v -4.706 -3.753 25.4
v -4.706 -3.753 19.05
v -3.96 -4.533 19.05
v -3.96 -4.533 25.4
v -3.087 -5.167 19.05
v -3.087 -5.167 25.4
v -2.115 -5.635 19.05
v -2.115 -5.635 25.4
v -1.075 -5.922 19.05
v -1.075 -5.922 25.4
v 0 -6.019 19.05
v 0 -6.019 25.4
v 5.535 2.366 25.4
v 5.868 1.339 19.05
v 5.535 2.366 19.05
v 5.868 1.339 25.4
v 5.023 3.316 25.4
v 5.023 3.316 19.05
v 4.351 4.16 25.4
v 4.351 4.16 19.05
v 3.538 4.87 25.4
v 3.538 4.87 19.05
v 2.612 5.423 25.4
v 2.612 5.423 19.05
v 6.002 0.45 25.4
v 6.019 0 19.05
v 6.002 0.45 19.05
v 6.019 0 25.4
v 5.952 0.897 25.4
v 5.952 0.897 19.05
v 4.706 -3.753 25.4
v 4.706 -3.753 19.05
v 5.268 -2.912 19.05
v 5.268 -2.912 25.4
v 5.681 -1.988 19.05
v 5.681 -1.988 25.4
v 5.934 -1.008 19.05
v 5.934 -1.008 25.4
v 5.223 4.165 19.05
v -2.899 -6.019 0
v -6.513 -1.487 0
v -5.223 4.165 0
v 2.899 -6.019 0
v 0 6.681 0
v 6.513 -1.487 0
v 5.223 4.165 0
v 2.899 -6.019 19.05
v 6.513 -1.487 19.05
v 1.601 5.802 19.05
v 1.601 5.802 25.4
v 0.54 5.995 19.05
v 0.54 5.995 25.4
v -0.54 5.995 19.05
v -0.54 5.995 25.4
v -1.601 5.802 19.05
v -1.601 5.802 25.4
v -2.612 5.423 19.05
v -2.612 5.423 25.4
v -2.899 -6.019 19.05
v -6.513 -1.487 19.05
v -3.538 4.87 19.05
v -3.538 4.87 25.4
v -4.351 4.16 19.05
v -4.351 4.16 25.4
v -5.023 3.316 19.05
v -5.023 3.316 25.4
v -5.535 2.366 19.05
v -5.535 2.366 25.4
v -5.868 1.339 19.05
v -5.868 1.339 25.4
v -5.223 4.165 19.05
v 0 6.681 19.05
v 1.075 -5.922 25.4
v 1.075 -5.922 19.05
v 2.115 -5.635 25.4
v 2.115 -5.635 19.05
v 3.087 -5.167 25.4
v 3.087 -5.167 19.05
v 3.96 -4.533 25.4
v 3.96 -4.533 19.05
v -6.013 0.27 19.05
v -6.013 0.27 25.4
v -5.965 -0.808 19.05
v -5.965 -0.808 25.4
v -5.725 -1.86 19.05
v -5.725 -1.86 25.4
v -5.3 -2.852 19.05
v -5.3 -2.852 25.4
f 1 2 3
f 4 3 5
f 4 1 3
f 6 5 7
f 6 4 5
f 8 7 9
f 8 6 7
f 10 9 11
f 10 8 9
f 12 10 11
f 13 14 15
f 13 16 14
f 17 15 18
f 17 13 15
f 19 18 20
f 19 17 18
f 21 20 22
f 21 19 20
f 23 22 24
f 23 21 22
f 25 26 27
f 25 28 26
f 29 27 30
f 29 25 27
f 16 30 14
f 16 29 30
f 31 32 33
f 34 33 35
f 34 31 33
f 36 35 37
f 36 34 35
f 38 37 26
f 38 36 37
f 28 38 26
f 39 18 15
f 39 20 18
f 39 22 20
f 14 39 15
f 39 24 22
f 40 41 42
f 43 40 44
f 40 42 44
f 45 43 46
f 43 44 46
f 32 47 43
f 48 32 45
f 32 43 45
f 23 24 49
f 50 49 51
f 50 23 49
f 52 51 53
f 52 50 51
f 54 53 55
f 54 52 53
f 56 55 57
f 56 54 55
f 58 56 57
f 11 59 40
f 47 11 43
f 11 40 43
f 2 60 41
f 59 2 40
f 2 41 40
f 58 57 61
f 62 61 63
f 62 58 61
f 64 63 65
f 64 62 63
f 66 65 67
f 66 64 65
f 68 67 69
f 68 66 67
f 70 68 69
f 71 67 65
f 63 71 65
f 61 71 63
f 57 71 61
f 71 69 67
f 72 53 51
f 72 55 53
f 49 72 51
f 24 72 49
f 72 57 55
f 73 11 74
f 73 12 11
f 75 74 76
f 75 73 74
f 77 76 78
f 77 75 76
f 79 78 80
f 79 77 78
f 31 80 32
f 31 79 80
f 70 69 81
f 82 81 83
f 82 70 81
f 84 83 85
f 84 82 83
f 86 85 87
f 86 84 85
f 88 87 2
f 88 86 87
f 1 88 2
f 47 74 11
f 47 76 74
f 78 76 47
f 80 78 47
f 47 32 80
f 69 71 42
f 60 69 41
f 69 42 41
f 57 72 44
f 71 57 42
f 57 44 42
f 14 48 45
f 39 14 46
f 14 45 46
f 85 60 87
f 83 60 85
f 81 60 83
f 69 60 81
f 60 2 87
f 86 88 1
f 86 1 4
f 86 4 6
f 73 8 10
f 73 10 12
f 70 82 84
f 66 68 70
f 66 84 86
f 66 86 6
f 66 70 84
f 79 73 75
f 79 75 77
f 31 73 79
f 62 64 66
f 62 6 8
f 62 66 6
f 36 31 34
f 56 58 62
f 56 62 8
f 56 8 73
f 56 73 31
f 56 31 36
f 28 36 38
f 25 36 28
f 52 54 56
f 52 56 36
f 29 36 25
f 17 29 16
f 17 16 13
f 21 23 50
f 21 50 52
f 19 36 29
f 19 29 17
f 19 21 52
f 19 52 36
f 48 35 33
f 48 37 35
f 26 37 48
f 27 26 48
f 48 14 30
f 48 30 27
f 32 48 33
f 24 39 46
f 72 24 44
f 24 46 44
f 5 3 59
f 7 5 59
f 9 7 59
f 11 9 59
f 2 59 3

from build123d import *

# Parameters (mm, degrees)
F0_R     = 4.7625
F1_DEPTH = 19.05
F4_R     = 6.0191962191


with BuildPart() as f1:
    # F0 (on Top) → F1 (new body)
    with BuildSketch(Plane.XY):
        Polygon((5.2232627241, 4.1654130256), (0, 6.6808037809), (-5.2232627241, 4.1654130256), (-6.5133020818, -1.4866186969), (-2.8986921248, -6.0191962191), (2.8986921248, -6.0191962191), (6.5133020818, -1.4866186969), align=None)
        Circle(F0_R, mode=Mode.SUBTRACT)
        Circle(F0_R)
    extrude(amount=F1_DEPTH)

    # F2 (on face) → F5 section 0
    with BuildSketch(Plane.XY.offset(19.05)):
        with BuildLine():
            ThreePointArc((4.7059970769, -3.7529074911), (5.6814189661, -1.9880145009), (6.0191962191, 0))
            ThreePointArc((6.0191962191, 0), (5.9813487804, 0.6739361184), (5.8682824176, 1.3393970999))
            ThreePointArc((5.8682824176, 1.3393970999), (4.7059971119, 3.7529074472), (2.6116313274, 5.4231084199))
            ThreePointArc((2.6116313274, 5.4231084199), (-1.32e-08, 6.0191962191), (-2.6116313513, 5.4231084084))
            ThreePointArc((-2.6116313513, 5.4231084084), (-4.7059970812, 3.7529074856), (-5.8682823899, 1.3393972216))
            ThreePointArc((-5.8682823899, 1.3393972216), (-5.8682824076, -1.3393971439), (-4.7059970929, -3.752907471))
            ThreePointArc((-4.7059970929, -3.752907471), (-2.6116313545, -5.4231084068), (0, -6.0191962191))
            ThreePointArc((0, -6.0191962191), (2.611631343, -5.4231084124), (4.7059970769, -3.7529074911))
        make_face()
    # F4 (on offset) → F5 section 1
    with BuildSketch(Plane.XY.offset(25.4)):
        Circle(F4_R)
    loft()


solid = f1.part
